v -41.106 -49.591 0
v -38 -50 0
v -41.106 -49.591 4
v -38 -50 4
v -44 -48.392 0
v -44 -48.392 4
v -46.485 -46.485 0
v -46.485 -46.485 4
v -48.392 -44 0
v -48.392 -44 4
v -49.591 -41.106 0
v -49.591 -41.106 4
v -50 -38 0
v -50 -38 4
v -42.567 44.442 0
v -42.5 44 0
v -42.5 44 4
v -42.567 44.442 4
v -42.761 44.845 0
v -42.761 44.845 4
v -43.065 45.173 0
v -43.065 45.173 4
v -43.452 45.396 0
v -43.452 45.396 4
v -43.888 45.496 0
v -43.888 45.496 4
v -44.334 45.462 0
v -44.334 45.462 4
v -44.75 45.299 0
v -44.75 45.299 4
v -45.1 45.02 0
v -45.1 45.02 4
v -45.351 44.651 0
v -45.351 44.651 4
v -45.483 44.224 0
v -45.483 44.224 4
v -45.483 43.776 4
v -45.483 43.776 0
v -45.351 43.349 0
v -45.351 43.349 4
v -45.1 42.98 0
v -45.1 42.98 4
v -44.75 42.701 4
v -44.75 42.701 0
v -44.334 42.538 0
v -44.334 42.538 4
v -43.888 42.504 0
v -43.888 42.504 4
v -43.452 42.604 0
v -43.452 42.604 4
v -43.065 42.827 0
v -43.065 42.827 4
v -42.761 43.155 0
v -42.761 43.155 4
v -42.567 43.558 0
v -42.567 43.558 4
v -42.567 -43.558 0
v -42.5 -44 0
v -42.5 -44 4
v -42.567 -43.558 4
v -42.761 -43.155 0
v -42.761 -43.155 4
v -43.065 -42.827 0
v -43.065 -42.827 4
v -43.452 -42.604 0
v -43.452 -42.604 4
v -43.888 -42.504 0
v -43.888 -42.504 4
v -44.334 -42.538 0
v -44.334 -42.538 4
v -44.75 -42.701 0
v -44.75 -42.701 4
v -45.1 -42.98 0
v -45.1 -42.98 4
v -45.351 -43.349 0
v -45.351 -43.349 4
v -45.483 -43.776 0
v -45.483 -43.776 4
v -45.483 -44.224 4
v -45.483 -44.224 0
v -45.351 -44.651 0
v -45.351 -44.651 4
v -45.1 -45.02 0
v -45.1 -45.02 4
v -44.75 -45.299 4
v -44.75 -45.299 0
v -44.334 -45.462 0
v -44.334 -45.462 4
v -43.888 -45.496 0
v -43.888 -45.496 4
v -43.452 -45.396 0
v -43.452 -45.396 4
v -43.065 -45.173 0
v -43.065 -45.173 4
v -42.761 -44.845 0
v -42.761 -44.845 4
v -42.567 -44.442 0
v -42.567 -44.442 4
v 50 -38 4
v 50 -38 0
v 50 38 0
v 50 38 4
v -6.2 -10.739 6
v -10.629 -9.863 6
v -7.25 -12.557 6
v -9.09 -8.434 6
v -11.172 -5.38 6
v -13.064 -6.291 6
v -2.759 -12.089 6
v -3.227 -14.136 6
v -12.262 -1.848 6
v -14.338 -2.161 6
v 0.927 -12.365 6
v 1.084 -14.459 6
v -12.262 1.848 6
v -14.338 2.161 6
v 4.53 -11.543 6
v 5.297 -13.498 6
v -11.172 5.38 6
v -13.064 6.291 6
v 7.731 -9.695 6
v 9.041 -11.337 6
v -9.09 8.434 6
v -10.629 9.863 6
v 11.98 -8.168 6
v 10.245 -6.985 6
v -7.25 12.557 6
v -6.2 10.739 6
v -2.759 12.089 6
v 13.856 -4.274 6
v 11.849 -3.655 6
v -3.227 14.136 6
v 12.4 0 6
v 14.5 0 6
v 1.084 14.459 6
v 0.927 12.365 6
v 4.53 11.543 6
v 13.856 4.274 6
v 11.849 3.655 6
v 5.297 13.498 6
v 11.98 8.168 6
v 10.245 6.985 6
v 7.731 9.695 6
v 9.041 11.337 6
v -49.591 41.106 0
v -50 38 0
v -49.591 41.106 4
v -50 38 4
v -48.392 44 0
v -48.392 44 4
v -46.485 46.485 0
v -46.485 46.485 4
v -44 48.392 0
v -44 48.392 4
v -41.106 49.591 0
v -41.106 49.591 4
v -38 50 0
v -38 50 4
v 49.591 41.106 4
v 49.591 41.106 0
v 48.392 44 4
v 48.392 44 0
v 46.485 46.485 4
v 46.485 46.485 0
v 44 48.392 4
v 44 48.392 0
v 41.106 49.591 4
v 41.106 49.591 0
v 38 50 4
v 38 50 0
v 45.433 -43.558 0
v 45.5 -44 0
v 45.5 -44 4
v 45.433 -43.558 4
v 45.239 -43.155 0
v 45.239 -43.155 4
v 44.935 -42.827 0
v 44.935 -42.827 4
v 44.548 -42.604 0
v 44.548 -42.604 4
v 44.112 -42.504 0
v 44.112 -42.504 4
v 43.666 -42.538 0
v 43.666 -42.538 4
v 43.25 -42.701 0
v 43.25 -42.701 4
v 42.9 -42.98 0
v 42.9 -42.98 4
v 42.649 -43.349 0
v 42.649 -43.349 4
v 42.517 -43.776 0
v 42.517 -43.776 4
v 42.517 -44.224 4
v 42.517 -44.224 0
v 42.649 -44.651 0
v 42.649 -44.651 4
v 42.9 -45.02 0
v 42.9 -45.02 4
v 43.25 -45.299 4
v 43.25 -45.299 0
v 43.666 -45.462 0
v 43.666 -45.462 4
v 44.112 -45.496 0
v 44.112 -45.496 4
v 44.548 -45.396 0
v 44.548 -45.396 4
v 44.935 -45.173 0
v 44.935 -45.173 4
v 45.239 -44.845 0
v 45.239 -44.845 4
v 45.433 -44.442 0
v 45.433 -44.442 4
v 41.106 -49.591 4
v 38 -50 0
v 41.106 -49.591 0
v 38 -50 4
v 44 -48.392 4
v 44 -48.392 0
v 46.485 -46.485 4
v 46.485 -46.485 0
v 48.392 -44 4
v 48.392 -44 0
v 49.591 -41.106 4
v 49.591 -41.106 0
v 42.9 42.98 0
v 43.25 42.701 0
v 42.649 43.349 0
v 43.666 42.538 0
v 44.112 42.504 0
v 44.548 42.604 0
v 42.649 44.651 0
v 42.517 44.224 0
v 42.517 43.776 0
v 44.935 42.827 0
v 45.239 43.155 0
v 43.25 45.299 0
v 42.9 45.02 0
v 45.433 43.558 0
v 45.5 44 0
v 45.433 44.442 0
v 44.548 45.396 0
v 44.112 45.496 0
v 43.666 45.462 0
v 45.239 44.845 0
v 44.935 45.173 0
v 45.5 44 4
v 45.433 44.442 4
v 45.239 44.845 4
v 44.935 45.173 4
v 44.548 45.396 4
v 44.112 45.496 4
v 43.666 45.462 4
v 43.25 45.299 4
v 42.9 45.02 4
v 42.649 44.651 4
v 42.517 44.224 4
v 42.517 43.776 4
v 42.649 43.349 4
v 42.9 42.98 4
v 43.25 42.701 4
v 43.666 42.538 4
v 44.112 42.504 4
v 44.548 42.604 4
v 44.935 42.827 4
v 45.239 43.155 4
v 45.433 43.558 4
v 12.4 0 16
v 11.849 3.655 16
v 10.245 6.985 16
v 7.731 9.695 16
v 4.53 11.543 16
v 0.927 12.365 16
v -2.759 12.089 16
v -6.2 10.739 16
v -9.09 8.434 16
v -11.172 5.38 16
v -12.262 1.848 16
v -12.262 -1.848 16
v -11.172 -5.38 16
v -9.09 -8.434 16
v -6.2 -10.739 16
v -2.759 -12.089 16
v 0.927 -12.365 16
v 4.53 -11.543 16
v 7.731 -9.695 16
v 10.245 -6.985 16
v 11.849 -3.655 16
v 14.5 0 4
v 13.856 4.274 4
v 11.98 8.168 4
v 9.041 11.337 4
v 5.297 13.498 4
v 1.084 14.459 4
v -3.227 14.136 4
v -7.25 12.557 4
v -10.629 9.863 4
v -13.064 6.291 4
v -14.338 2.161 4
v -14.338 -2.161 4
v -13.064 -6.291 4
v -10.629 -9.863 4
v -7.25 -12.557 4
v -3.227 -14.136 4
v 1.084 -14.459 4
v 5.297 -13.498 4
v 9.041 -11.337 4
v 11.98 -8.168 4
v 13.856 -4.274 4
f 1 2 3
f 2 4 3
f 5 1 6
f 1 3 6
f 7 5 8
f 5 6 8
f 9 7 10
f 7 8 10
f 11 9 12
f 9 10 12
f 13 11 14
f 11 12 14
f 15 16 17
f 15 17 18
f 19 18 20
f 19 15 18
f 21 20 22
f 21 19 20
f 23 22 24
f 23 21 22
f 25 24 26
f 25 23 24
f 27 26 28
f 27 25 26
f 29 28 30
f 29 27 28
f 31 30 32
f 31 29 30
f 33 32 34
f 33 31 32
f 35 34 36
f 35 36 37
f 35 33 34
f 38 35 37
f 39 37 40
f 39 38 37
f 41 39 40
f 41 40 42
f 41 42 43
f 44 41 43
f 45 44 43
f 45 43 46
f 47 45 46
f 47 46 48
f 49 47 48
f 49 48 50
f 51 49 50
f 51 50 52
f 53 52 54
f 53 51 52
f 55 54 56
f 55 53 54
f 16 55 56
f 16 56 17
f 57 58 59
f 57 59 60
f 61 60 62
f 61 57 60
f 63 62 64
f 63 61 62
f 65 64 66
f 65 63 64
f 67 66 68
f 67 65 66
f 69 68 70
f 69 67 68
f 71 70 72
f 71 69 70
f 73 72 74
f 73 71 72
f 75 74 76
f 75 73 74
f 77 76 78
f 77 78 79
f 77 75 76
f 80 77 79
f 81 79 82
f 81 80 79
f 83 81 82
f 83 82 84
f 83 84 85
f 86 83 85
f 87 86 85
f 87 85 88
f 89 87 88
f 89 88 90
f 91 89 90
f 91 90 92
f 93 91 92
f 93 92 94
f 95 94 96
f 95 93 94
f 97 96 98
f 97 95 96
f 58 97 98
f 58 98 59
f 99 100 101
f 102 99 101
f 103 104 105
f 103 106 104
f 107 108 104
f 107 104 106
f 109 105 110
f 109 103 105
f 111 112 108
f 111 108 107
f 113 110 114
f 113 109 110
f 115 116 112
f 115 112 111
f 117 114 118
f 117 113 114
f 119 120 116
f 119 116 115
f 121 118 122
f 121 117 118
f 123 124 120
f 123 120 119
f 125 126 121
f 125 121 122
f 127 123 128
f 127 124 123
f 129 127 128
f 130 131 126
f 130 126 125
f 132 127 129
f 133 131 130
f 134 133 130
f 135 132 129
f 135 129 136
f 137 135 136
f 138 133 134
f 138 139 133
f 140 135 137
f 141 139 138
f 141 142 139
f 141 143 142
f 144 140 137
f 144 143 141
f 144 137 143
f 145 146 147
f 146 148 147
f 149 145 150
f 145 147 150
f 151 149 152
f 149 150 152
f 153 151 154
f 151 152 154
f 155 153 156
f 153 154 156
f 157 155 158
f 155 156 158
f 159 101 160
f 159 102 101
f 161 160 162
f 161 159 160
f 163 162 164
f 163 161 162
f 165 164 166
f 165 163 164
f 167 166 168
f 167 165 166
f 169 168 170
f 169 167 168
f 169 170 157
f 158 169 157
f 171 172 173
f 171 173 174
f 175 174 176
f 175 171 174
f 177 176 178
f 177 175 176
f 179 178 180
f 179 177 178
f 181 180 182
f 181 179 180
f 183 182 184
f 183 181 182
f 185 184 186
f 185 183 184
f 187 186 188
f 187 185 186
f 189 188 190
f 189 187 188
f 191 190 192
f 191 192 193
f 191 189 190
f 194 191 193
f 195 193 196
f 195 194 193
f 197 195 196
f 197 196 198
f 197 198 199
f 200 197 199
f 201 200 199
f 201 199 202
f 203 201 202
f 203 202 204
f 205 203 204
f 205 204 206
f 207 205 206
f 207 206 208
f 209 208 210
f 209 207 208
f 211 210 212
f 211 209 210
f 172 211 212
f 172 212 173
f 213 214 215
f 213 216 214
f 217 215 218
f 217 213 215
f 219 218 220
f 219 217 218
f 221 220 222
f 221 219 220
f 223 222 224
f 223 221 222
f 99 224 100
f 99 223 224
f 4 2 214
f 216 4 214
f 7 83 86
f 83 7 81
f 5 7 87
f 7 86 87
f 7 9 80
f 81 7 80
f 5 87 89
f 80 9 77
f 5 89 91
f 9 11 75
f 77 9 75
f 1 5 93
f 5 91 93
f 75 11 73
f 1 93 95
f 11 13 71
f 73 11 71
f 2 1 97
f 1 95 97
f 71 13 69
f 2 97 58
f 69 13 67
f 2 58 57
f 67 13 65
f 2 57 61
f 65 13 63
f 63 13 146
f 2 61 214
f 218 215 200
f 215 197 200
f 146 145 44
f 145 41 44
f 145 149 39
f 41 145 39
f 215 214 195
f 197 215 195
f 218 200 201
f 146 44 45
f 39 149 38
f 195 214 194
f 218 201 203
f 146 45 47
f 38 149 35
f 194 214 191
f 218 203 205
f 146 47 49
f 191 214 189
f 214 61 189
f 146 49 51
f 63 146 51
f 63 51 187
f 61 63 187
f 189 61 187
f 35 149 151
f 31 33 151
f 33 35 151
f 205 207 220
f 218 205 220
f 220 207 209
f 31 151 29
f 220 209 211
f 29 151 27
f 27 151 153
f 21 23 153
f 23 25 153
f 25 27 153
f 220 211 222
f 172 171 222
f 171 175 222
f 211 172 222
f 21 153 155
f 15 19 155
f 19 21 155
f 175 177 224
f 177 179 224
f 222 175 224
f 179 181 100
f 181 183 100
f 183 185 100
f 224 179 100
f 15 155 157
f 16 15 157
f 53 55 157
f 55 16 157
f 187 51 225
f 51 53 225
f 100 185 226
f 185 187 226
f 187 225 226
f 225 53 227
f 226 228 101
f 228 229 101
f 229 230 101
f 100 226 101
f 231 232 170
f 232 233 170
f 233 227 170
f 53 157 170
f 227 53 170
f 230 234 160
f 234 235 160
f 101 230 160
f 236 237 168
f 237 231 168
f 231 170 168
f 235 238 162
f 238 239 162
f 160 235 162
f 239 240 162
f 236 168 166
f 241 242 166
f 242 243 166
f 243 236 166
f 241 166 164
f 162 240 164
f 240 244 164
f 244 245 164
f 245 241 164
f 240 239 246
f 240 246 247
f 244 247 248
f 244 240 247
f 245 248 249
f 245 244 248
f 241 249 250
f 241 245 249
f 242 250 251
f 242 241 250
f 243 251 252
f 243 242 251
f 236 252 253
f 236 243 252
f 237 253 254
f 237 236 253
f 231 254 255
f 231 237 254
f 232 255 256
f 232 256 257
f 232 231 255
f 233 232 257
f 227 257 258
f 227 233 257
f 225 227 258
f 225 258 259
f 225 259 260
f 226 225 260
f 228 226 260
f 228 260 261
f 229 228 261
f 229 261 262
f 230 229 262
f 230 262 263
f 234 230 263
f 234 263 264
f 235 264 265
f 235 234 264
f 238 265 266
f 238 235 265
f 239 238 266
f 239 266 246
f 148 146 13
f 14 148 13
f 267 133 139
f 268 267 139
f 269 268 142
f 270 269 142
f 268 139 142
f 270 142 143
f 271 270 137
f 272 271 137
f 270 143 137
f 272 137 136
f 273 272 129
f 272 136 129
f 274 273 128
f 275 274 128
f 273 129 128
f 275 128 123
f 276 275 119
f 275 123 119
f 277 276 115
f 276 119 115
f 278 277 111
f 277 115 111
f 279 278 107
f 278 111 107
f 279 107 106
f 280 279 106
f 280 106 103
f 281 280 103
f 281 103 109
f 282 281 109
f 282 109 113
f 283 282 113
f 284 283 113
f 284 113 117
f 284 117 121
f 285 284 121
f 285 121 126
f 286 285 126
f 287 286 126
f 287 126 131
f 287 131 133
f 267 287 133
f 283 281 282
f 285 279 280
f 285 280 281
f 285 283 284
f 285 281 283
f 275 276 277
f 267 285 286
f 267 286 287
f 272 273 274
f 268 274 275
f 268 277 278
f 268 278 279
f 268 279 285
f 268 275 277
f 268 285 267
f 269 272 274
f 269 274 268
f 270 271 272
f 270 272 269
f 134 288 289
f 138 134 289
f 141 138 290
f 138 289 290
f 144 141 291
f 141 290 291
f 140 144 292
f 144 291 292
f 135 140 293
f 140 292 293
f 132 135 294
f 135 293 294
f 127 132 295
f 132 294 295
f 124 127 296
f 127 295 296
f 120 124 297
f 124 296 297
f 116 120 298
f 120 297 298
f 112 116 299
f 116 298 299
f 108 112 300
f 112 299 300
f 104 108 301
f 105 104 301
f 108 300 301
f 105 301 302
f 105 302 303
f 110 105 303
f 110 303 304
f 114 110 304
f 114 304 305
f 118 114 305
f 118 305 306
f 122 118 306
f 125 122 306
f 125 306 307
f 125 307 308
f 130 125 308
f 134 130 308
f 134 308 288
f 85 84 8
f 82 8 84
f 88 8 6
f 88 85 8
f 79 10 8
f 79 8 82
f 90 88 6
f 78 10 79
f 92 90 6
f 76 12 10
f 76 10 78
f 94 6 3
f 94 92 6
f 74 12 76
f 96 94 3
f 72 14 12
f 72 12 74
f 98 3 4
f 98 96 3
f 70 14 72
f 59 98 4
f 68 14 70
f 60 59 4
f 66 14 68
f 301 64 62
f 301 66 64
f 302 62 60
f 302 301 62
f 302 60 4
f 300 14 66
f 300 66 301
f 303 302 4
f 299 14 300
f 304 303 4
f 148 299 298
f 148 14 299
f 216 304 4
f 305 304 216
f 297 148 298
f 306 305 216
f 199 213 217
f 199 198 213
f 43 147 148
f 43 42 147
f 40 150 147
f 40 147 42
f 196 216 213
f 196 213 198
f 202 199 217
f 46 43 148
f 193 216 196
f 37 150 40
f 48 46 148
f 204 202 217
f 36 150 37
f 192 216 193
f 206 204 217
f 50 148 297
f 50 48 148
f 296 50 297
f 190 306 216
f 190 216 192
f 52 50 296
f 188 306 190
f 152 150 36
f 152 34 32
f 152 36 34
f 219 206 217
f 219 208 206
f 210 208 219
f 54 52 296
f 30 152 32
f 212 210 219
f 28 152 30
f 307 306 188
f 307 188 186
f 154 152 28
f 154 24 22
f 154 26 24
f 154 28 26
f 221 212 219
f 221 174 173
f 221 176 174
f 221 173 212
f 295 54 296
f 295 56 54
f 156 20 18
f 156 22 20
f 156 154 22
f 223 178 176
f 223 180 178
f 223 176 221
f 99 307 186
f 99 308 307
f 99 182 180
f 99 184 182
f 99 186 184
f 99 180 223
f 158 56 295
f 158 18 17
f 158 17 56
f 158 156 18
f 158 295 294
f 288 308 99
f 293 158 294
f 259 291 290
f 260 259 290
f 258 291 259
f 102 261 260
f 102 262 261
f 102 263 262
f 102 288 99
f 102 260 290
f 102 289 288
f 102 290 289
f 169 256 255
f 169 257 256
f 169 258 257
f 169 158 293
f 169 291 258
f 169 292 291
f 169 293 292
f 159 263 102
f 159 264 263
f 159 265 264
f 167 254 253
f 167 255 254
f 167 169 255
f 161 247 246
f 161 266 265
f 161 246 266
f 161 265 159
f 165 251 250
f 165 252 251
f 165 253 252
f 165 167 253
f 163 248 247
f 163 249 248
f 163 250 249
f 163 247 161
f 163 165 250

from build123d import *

# Parameters (mm, degrees)
F0_R     = 1.5
F0_R_2   = 14.5
F1_DEPTH = 4
F2_R     = 12
F0_R_3   = 12.4
F3_DEPTH = 6
F4_DEPTH = 16


with BuildPart() as f1:
    # F0 (on Top) → F1 (new body)
    with BuildSketch(Plane.XY):
        with BuildLine():
            Line((-50, 40.1261364576), (-50, -40.1261364576))
            ThreePointArc((-50, -40.1261364576), (-48.5323223277, -39.658202653), (-47, -39.5))
            Line((-47, -39.5), (-47, 39.5))
            ThreePointArc((-47, 39.5), (-48.5323223277, 39.658202653), (-50, 40.1261364576))
        make_face()
        with BuildLine():
            Line((-50, -50), (-40.1261364576, -50))
            ThreePointArc((-40.1261364576, -50), (-39.658202653, -48.5323223277), (-39.5, -47))
            Line((-39.5, -47), (-47, -47))
            Line((-47, -47), (-47, -39.5))
            ThreePointArc((-47, -39.5), (-48.5323223277, -39.658202653), (-50, -40.1261364576))
            Line((-50, -40.1261364576), (-50, -50))
        make_face()
        with BuildLine():
            Line((-47, -47), (-39.5, -47))
            ThreePointArc((-39.5, -47), (-41.6966991411, -41.6966991411), (-47, -39.5))
            Line((-47, -39.5), (-47, -47))
        make_face()
        with Locations((-44, -44)):
            Circle(F0_R, mode=Mode.SUBTRACT)
        with BuildLine():
            Line((-40.1261364576, -50), (40.1261364576, -50))
            ThreePointArc((40.1261364576, -50), (39.658202653, -48.5323223277), (39.5, -47))
            Line((39.5, -47), (-39.5, -47))
            ThreePointArc((-39.5, -47), (-39.658202653, -48.5323223277), (-40.1261364576, -50))
        make_face()
        with BuildLine():
            Line((40.1261364576, -50), (50, -50))
            Line((50, -50), (50, -40.1261364576))
            ThreePointArc((50, -40.1261364576), (48.5323223277, -39.658202653), (47, -39.5))
            Line((47, -39.5), (47, -47))
            Line((47, -47), (39.5, -47))
            ThreePointArc((39.5, -47), (39.658202653, -48.5323223277), (40.1261364576, -50))
        make_face()
        with BuildLine():
            ThreePointArc((47, -39.5), (41.6966991411, -41.6966991411), (39.5, -47))
            Line((39.5, -47), (47, -47))
            Line((47, -47), (47, -39.5))
        make_face()
        with Locations((44, -44)):
            Circle(F0_R, mode=Mode.SUBTRACT)
        with BuildLine():
            ThreePointArc((47, -39.5), (48.5323223277, -39.658202653), (50, -40.1261364576))
            Line((50, -40.1261364576), (50, 40.1261364576))
            ThreePointArc((50, 40.1261364576), (48.5323223277, 39.658202653), (47, 39.5))
            Line((47, 39.5), (47, -39.5))
        make_face()
        with BuildLine():
            ThreePointArc((47, 39.5), (48.5323223277, 39.658202653), (50, 40.1261364576))
            Line((50, 40.1261364576), (50, 50))
            Line((50, 50), (40.1261364576, 50))
            ThreePointArc((40.1261364576, 50), (39.658202653, 48.5323223277), (39.5, 47))
            Line((39.5, 47), (47, 47))
            Line((47, 47), (47, 39.5))
        make_face()
        with BuildLine():
            ThreePointArc((39.5, 47), (41.6966991411, 41.6966991411), (47, 39.5))
            Line((47, 39.5), (47, 47))
            Line((47, 47), (39.5, 47))
        make_face()
        with Locations((44, 44)):
            Circle(F0_R, mode=Mode.SUBTRACT)
        with BuildLine():
            ThreePointArc((39.5, 47), (39.658202653, 48.5323223277), (40.1261364576, 50))
            Line((40.1261364576, 50), (-40.1261364576, 50))
            ThreePointArc((-40.1261364576, 50), (-39.658202653, 48.5323223277), (-39.5, 47))
            Line((-39.5, 47), (39.5, 47))
        make_face()
        with BuildLine():
            Line((-50, 50), (-50, 40.1261364576))
            ThreePointArc((-50, 40.1261364576), (-48.5323223277, 39.658202653), (-47, 39.5))
            Line((-47, 39.5), (-47, 47))
            Line((-47, 47), (-39.5, 47))
            ThreePointArc((-39.5, 47), (-39.658202653, 48.5323223277), (-40.1261364576, 50))
            Line((-40.1261364576, 50), (-50, 50))
        make_face()
        with BuildLine():
            Line((-47, 47), (-47, 39.5))
            ThreePointArc((-47, 39.5), (-41.6966991411, 41.6966991411), (-39.5, 47))
            Line((-39.5, 47), (-47, 47))
        make_face()
        with Locations((-44, 44)):
            Circle(F0_R, mode=Mode.SUBTRACT)
        with BuildLine():
            Line((-39.5, -47), (39.5, -47))
            ThreePointArc((39.5, -47), (41.6966991411, -41.6966991411), (47, -39.5))
            Line((47, -39.5), (47, 39.5))
            ThreePointArc((47, 39.5), (41.6966991411, 41.6966991411), (39.5, 47))
            Line((39.5, 47), (-39.5, 47))
            ThreePointArc((-39.5, 47), (-41.6966991411, 41.6966991411), (-47, 39.5))
            Line((-47, 39.5), (-47, -39.5))
            ThreePointArc((-47, -39.5), (-41.6966991411, -41.6966991411), (-39.5, -47))
        make_face()
        Circle(F0_R_2, mode=Mode.SUBTRACT)
    extrude(amount=F1_DEPTH)

    # F2
    f2_edges = [f1.edges().sort_by_distance(p)[0] for p in [
        (-50, 50, 2),
        (50, 50, 2),
        (50, -50, 2),
        (-50, -50, 2),
    ]]
    fillet(f2_edges, radius=F2_R)

    # F0 (on Top) → F3 (join)
    with BuildSketch(Plane.XY):
        Circle(F0_R_2)
        Circle(F0_R_3, mode=Mode.SUBTRACT)
    extrude(amount=F3_DEPTH)

    # F0 (on Top) → F4 (join)
    with BuildSketch(Plane.XY):
        Circle(F0_R_3)
    extrude(amount=F4_DEPTH)


solid = f1.part
